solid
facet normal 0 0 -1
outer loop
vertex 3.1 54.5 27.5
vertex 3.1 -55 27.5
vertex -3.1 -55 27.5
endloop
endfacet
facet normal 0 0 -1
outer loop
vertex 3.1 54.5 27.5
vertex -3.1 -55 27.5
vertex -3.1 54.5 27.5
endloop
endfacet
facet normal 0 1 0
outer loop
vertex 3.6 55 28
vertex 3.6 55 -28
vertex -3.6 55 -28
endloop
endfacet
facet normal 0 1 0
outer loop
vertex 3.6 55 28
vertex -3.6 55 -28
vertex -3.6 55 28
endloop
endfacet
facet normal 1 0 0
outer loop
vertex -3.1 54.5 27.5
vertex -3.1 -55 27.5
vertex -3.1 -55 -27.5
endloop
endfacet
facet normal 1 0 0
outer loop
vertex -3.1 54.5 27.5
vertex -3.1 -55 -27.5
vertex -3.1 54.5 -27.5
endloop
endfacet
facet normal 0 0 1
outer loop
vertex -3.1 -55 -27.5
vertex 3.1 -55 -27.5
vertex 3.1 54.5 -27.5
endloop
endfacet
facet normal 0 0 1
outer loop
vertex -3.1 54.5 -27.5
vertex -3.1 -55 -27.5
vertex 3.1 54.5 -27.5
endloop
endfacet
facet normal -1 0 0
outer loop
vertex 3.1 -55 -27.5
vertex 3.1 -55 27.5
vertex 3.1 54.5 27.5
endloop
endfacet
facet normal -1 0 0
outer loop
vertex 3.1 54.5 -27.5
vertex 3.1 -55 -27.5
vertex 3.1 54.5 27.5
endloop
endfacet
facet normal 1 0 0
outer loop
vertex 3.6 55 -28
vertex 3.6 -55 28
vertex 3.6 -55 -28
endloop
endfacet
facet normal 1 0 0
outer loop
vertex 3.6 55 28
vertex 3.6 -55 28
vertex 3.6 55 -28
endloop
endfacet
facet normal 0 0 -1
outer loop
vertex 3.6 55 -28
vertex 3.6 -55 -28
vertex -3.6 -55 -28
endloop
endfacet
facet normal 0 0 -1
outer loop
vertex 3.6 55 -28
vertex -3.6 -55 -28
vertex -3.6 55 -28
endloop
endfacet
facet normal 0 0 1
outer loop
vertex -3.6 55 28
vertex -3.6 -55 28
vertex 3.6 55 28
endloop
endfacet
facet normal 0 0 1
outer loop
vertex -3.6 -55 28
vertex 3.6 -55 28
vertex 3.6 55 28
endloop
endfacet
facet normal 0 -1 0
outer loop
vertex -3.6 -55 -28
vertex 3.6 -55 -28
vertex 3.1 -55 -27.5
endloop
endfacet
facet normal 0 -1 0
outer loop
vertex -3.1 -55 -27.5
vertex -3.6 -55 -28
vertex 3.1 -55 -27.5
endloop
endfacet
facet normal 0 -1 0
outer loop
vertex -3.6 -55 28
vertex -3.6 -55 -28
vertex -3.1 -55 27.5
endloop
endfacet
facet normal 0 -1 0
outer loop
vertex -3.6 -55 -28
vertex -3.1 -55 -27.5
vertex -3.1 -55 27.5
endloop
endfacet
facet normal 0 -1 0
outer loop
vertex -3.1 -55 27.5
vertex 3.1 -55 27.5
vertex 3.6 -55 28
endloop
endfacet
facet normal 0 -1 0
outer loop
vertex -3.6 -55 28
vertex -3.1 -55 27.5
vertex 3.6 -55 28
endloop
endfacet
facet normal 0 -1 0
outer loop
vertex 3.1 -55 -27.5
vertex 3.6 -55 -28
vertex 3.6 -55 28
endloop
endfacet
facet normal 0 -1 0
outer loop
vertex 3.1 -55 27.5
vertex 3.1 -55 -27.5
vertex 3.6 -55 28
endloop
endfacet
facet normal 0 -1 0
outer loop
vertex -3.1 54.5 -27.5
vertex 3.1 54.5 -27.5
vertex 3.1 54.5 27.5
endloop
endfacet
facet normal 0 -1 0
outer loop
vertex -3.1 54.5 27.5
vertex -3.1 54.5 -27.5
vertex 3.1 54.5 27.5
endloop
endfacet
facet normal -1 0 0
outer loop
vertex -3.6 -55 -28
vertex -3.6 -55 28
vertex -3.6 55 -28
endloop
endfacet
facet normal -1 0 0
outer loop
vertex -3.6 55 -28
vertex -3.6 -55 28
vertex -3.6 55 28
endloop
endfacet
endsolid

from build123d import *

# Parameters (mm, degrees)
F0_W     = 110
F0_H     = 56
F1_DEPTH = 3.6
F2_T     = -0.5


with BuildPart() as f1:
    # F0 (on Right) → F1 (new body, symmetric)
    with BuildSketch(Plane.YZ):
        Rectangle(F0_W, F0_H)
    extrude(amount=F1_DEPTH, both=True)

    # F2
    f2_openings = [f1.faces().sort_by_distance(p)[0] for p in [
        (0, -55, 0),
    ]]
    offset(amount=F2_T, openings=f2_openings)


solid = f1.part
